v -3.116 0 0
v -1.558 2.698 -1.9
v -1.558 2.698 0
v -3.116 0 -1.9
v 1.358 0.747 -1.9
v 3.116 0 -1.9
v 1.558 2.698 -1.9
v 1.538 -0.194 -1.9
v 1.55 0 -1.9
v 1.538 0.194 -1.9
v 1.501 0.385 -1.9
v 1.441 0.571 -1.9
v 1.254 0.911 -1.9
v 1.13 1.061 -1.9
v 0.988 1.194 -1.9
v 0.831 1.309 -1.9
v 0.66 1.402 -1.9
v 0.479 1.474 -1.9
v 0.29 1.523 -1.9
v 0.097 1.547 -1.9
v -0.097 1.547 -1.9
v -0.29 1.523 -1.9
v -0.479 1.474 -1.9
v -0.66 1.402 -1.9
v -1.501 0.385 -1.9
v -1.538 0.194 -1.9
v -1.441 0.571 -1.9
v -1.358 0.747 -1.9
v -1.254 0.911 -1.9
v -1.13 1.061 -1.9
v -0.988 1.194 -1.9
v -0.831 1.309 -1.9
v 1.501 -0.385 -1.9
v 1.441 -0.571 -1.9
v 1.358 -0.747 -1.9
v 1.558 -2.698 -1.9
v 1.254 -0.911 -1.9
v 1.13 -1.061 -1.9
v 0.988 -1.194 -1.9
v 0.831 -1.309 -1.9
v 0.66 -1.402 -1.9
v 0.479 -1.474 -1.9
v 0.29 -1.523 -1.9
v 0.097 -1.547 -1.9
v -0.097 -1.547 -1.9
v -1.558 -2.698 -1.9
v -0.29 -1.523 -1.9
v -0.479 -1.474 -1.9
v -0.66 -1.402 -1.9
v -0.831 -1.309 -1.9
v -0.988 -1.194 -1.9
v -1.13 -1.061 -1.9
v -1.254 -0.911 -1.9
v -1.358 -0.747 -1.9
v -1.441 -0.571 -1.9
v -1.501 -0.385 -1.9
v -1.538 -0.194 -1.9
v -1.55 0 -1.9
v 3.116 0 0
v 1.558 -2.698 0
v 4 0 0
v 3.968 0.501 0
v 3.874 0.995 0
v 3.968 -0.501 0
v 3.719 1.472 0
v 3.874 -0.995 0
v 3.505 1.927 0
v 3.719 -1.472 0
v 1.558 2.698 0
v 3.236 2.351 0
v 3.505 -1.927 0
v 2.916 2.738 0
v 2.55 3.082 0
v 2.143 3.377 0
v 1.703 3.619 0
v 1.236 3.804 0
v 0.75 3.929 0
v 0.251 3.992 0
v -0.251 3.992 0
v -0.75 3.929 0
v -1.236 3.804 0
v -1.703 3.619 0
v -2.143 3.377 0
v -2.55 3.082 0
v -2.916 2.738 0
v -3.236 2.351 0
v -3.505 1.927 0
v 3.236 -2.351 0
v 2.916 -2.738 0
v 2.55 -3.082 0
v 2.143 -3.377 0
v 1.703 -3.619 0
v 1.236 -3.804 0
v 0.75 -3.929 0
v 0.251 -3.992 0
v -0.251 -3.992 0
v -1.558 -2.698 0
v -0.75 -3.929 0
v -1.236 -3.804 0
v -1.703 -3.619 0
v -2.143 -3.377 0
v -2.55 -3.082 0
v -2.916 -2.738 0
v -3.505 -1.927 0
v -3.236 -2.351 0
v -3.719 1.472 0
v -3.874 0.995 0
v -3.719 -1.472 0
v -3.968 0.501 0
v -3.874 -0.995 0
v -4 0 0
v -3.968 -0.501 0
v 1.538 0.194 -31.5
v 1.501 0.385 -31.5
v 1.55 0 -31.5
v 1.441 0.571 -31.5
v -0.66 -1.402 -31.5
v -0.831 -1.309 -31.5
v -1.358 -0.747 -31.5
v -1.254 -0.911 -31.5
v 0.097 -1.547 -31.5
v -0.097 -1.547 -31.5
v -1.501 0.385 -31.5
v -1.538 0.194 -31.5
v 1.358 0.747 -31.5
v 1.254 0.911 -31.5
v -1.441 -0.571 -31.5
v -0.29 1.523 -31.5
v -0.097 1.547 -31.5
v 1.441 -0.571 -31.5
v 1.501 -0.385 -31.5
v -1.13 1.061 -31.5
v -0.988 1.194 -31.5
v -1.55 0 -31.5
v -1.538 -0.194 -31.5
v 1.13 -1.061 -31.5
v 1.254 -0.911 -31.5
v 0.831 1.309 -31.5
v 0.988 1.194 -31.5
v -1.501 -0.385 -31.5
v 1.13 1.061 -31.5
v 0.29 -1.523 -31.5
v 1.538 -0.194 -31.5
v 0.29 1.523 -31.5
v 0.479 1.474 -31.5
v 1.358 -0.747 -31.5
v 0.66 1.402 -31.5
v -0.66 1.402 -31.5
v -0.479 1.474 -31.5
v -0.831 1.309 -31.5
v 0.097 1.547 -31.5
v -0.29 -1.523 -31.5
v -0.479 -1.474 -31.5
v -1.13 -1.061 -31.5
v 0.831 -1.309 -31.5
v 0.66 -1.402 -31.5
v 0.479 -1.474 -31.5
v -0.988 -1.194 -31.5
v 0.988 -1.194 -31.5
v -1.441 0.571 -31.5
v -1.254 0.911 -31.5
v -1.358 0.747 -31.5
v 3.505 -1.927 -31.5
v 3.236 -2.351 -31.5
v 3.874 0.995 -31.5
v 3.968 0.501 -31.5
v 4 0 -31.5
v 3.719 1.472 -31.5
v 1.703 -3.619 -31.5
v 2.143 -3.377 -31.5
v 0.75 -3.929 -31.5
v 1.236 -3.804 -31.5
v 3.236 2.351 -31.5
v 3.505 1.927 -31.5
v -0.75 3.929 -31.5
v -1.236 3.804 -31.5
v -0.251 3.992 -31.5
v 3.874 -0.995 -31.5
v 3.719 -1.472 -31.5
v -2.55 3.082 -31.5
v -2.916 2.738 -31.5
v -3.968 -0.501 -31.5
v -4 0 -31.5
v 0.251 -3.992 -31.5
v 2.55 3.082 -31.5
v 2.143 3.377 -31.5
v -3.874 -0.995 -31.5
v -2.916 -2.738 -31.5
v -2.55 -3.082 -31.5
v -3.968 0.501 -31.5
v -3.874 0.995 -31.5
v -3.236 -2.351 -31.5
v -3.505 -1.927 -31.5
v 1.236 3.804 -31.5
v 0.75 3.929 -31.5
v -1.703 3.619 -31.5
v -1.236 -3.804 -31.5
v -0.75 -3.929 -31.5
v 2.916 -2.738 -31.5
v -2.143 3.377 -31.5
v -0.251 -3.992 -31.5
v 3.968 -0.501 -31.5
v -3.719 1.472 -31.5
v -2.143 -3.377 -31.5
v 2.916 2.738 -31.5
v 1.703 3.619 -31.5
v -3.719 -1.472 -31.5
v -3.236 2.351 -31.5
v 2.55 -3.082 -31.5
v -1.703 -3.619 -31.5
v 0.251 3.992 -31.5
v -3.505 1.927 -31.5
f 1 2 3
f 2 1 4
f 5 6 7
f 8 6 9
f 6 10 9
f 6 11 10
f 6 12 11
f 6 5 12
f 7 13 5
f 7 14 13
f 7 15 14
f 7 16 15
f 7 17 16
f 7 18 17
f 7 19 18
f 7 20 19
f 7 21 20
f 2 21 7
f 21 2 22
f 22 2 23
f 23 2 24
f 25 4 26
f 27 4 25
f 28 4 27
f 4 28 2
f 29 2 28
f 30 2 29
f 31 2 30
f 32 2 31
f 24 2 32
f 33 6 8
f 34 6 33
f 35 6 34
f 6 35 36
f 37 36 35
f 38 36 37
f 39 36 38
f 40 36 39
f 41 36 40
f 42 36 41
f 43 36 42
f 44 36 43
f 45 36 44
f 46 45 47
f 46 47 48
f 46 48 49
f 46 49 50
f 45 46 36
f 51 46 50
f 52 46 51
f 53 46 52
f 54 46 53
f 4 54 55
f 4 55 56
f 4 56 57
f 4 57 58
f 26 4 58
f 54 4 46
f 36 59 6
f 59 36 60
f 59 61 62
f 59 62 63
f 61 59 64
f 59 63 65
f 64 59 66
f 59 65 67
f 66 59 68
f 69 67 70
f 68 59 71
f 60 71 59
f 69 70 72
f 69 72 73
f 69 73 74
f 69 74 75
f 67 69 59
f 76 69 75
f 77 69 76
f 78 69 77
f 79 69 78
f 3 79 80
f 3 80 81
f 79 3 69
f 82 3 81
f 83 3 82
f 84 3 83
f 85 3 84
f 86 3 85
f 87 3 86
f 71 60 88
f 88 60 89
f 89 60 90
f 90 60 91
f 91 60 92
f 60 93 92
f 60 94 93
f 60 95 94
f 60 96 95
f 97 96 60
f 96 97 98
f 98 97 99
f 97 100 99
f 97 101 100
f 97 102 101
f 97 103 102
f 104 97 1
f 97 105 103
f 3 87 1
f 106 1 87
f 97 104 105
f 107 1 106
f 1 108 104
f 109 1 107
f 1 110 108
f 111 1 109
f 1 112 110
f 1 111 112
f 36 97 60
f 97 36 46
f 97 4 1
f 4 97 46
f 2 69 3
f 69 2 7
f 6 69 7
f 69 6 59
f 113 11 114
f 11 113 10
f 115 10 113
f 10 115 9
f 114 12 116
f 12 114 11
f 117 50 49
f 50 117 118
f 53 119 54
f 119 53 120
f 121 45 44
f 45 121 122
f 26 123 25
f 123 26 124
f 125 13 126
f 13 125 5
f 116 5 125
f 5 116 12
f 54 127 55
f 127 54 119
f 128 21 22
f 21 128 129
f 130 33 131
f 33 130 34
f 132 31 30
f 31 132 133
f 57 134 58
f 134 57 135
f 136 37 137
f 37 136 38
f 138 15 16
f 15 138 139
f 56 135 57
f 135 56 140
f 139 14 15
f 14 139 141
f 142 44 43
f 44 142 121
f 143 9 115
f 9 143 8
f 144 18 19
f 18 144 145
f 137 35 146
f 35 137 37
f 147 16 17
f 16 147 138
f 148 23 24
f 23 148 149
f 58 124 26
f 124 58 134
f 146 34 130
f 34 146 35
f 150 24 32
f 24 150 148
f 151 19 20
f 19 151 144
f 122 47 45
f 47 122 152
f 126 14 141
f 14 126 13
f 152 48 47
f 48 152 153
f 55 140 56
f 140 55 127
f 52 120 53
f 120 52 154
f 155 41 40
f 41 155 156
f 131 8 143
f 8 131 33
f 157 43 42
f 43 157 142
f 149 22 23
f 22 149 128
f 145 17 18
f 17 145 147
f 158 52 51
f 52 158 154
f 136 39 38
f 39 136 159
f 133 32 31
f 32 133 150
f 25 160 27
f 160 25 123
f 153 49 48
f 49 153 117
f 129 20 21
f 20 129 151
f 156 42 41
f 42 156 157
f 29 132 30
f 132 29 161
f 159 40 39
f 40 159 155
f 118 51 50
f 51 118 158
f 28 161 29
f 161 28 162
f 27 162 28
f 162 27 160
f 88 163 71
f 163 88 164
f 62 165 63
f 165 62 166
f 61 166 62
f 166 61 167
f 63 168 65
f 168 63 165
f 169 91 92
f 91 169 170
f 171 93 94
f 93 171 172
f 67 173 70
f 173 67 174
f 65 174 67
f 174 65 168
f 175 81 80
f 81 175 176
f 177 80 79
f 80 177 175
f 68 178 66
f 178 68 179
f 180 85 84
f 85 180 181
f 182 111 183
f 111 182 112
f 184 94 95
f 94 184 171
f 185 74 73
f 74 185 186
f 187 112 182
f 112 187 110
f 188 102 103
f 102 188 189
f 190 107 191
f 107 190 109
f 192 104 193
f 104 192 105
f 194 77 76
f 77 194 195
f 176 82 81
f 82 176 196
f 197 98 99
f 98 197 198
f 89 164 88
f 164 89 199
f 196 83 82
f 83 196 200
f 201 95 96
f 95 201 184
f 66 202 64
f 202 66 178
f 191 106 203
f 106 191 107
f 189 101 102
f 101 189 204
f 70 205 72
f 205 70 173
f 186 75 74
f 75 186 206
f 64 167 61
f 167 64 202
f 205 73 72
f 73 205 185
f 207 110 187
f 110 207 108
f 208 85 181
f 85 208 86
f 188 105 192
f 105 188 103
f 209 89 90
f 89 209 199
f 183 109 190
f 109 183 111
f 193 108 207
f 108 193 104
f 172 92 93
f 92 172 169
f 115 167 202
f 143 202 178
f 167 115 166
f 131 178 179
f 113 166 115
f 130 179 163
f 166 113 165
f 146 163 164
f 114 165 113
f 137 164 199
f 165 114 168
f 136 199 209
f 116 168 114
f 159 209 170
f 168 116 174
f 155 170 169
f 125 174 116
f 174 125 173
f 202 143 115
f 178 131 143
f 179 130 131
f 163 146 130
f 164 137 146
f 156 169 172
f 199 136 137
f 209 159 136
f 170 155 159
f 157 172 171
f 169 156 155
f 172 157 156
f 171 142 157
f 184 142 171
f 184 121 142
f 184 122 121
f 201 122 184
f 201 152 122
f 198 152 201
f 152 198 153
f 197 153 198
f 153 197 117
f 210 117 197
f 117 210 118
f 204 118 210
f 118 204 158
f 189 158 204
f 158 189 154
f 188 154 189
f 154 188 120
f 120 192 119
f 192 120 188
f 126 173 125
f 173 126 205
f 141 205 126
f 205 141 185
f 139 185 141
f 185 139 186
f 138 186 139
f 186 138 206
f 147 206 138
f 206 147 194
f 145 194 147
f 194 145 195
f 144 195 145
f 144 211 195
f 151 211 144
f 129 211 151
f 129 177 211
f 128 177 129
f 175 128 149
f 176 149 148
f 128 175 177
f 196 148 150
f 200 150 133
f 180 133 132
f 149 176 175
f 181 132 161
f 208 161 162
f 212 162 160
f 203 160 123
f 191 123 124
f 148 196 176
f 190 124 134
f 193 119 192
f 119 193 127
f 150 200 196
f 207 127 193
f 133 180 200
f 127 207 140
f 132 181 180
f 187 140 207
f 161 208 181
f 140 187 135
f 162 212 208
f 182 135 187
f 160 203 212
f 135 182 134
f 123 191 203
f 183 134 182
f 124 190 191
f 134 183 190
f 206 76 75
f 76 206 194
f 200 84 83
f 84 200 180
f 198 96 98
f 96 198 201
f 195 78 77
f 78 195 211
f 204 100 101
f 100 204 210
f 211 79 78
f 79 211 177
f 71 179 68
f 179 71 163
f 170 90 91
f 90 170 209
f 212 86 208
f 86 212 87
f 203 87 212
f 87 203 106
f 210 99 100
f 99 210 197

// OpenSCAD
$fn = 50;

difference() {
	union() {
		translate(v = [0, 0, -31.5]) {
			cylinder(h = 34.5, r = 4.0);
		}
	}
	union() {
		translate(v = [0, 0, 0]) {
			rotate(a = [0, 0, 0]) {
				difference() {
					union() {
						translate(v = [0, 0, -1.9]) {
							linear_extrude(height = 1.9) {
								polygon(points = [[3.1158, 0.0], [1.5579000000000005, 2.698361953111554], [-1.5578999999999994, 2.6983619531115544], [-3.1158, 3.815754496783323e-16], [-1.5579000000000014, -2.6983619531115535], [1.557899999999998, -2.6983619531115552]]);
							}
						}
					}
					union();
				}
			}
		}
		#cylinder(h = 3, r = 5.0);
		#translate(v = [0, 0, -100.0]) {
			cylinder(h = 200, r = 1.55);
		}
	}
}
